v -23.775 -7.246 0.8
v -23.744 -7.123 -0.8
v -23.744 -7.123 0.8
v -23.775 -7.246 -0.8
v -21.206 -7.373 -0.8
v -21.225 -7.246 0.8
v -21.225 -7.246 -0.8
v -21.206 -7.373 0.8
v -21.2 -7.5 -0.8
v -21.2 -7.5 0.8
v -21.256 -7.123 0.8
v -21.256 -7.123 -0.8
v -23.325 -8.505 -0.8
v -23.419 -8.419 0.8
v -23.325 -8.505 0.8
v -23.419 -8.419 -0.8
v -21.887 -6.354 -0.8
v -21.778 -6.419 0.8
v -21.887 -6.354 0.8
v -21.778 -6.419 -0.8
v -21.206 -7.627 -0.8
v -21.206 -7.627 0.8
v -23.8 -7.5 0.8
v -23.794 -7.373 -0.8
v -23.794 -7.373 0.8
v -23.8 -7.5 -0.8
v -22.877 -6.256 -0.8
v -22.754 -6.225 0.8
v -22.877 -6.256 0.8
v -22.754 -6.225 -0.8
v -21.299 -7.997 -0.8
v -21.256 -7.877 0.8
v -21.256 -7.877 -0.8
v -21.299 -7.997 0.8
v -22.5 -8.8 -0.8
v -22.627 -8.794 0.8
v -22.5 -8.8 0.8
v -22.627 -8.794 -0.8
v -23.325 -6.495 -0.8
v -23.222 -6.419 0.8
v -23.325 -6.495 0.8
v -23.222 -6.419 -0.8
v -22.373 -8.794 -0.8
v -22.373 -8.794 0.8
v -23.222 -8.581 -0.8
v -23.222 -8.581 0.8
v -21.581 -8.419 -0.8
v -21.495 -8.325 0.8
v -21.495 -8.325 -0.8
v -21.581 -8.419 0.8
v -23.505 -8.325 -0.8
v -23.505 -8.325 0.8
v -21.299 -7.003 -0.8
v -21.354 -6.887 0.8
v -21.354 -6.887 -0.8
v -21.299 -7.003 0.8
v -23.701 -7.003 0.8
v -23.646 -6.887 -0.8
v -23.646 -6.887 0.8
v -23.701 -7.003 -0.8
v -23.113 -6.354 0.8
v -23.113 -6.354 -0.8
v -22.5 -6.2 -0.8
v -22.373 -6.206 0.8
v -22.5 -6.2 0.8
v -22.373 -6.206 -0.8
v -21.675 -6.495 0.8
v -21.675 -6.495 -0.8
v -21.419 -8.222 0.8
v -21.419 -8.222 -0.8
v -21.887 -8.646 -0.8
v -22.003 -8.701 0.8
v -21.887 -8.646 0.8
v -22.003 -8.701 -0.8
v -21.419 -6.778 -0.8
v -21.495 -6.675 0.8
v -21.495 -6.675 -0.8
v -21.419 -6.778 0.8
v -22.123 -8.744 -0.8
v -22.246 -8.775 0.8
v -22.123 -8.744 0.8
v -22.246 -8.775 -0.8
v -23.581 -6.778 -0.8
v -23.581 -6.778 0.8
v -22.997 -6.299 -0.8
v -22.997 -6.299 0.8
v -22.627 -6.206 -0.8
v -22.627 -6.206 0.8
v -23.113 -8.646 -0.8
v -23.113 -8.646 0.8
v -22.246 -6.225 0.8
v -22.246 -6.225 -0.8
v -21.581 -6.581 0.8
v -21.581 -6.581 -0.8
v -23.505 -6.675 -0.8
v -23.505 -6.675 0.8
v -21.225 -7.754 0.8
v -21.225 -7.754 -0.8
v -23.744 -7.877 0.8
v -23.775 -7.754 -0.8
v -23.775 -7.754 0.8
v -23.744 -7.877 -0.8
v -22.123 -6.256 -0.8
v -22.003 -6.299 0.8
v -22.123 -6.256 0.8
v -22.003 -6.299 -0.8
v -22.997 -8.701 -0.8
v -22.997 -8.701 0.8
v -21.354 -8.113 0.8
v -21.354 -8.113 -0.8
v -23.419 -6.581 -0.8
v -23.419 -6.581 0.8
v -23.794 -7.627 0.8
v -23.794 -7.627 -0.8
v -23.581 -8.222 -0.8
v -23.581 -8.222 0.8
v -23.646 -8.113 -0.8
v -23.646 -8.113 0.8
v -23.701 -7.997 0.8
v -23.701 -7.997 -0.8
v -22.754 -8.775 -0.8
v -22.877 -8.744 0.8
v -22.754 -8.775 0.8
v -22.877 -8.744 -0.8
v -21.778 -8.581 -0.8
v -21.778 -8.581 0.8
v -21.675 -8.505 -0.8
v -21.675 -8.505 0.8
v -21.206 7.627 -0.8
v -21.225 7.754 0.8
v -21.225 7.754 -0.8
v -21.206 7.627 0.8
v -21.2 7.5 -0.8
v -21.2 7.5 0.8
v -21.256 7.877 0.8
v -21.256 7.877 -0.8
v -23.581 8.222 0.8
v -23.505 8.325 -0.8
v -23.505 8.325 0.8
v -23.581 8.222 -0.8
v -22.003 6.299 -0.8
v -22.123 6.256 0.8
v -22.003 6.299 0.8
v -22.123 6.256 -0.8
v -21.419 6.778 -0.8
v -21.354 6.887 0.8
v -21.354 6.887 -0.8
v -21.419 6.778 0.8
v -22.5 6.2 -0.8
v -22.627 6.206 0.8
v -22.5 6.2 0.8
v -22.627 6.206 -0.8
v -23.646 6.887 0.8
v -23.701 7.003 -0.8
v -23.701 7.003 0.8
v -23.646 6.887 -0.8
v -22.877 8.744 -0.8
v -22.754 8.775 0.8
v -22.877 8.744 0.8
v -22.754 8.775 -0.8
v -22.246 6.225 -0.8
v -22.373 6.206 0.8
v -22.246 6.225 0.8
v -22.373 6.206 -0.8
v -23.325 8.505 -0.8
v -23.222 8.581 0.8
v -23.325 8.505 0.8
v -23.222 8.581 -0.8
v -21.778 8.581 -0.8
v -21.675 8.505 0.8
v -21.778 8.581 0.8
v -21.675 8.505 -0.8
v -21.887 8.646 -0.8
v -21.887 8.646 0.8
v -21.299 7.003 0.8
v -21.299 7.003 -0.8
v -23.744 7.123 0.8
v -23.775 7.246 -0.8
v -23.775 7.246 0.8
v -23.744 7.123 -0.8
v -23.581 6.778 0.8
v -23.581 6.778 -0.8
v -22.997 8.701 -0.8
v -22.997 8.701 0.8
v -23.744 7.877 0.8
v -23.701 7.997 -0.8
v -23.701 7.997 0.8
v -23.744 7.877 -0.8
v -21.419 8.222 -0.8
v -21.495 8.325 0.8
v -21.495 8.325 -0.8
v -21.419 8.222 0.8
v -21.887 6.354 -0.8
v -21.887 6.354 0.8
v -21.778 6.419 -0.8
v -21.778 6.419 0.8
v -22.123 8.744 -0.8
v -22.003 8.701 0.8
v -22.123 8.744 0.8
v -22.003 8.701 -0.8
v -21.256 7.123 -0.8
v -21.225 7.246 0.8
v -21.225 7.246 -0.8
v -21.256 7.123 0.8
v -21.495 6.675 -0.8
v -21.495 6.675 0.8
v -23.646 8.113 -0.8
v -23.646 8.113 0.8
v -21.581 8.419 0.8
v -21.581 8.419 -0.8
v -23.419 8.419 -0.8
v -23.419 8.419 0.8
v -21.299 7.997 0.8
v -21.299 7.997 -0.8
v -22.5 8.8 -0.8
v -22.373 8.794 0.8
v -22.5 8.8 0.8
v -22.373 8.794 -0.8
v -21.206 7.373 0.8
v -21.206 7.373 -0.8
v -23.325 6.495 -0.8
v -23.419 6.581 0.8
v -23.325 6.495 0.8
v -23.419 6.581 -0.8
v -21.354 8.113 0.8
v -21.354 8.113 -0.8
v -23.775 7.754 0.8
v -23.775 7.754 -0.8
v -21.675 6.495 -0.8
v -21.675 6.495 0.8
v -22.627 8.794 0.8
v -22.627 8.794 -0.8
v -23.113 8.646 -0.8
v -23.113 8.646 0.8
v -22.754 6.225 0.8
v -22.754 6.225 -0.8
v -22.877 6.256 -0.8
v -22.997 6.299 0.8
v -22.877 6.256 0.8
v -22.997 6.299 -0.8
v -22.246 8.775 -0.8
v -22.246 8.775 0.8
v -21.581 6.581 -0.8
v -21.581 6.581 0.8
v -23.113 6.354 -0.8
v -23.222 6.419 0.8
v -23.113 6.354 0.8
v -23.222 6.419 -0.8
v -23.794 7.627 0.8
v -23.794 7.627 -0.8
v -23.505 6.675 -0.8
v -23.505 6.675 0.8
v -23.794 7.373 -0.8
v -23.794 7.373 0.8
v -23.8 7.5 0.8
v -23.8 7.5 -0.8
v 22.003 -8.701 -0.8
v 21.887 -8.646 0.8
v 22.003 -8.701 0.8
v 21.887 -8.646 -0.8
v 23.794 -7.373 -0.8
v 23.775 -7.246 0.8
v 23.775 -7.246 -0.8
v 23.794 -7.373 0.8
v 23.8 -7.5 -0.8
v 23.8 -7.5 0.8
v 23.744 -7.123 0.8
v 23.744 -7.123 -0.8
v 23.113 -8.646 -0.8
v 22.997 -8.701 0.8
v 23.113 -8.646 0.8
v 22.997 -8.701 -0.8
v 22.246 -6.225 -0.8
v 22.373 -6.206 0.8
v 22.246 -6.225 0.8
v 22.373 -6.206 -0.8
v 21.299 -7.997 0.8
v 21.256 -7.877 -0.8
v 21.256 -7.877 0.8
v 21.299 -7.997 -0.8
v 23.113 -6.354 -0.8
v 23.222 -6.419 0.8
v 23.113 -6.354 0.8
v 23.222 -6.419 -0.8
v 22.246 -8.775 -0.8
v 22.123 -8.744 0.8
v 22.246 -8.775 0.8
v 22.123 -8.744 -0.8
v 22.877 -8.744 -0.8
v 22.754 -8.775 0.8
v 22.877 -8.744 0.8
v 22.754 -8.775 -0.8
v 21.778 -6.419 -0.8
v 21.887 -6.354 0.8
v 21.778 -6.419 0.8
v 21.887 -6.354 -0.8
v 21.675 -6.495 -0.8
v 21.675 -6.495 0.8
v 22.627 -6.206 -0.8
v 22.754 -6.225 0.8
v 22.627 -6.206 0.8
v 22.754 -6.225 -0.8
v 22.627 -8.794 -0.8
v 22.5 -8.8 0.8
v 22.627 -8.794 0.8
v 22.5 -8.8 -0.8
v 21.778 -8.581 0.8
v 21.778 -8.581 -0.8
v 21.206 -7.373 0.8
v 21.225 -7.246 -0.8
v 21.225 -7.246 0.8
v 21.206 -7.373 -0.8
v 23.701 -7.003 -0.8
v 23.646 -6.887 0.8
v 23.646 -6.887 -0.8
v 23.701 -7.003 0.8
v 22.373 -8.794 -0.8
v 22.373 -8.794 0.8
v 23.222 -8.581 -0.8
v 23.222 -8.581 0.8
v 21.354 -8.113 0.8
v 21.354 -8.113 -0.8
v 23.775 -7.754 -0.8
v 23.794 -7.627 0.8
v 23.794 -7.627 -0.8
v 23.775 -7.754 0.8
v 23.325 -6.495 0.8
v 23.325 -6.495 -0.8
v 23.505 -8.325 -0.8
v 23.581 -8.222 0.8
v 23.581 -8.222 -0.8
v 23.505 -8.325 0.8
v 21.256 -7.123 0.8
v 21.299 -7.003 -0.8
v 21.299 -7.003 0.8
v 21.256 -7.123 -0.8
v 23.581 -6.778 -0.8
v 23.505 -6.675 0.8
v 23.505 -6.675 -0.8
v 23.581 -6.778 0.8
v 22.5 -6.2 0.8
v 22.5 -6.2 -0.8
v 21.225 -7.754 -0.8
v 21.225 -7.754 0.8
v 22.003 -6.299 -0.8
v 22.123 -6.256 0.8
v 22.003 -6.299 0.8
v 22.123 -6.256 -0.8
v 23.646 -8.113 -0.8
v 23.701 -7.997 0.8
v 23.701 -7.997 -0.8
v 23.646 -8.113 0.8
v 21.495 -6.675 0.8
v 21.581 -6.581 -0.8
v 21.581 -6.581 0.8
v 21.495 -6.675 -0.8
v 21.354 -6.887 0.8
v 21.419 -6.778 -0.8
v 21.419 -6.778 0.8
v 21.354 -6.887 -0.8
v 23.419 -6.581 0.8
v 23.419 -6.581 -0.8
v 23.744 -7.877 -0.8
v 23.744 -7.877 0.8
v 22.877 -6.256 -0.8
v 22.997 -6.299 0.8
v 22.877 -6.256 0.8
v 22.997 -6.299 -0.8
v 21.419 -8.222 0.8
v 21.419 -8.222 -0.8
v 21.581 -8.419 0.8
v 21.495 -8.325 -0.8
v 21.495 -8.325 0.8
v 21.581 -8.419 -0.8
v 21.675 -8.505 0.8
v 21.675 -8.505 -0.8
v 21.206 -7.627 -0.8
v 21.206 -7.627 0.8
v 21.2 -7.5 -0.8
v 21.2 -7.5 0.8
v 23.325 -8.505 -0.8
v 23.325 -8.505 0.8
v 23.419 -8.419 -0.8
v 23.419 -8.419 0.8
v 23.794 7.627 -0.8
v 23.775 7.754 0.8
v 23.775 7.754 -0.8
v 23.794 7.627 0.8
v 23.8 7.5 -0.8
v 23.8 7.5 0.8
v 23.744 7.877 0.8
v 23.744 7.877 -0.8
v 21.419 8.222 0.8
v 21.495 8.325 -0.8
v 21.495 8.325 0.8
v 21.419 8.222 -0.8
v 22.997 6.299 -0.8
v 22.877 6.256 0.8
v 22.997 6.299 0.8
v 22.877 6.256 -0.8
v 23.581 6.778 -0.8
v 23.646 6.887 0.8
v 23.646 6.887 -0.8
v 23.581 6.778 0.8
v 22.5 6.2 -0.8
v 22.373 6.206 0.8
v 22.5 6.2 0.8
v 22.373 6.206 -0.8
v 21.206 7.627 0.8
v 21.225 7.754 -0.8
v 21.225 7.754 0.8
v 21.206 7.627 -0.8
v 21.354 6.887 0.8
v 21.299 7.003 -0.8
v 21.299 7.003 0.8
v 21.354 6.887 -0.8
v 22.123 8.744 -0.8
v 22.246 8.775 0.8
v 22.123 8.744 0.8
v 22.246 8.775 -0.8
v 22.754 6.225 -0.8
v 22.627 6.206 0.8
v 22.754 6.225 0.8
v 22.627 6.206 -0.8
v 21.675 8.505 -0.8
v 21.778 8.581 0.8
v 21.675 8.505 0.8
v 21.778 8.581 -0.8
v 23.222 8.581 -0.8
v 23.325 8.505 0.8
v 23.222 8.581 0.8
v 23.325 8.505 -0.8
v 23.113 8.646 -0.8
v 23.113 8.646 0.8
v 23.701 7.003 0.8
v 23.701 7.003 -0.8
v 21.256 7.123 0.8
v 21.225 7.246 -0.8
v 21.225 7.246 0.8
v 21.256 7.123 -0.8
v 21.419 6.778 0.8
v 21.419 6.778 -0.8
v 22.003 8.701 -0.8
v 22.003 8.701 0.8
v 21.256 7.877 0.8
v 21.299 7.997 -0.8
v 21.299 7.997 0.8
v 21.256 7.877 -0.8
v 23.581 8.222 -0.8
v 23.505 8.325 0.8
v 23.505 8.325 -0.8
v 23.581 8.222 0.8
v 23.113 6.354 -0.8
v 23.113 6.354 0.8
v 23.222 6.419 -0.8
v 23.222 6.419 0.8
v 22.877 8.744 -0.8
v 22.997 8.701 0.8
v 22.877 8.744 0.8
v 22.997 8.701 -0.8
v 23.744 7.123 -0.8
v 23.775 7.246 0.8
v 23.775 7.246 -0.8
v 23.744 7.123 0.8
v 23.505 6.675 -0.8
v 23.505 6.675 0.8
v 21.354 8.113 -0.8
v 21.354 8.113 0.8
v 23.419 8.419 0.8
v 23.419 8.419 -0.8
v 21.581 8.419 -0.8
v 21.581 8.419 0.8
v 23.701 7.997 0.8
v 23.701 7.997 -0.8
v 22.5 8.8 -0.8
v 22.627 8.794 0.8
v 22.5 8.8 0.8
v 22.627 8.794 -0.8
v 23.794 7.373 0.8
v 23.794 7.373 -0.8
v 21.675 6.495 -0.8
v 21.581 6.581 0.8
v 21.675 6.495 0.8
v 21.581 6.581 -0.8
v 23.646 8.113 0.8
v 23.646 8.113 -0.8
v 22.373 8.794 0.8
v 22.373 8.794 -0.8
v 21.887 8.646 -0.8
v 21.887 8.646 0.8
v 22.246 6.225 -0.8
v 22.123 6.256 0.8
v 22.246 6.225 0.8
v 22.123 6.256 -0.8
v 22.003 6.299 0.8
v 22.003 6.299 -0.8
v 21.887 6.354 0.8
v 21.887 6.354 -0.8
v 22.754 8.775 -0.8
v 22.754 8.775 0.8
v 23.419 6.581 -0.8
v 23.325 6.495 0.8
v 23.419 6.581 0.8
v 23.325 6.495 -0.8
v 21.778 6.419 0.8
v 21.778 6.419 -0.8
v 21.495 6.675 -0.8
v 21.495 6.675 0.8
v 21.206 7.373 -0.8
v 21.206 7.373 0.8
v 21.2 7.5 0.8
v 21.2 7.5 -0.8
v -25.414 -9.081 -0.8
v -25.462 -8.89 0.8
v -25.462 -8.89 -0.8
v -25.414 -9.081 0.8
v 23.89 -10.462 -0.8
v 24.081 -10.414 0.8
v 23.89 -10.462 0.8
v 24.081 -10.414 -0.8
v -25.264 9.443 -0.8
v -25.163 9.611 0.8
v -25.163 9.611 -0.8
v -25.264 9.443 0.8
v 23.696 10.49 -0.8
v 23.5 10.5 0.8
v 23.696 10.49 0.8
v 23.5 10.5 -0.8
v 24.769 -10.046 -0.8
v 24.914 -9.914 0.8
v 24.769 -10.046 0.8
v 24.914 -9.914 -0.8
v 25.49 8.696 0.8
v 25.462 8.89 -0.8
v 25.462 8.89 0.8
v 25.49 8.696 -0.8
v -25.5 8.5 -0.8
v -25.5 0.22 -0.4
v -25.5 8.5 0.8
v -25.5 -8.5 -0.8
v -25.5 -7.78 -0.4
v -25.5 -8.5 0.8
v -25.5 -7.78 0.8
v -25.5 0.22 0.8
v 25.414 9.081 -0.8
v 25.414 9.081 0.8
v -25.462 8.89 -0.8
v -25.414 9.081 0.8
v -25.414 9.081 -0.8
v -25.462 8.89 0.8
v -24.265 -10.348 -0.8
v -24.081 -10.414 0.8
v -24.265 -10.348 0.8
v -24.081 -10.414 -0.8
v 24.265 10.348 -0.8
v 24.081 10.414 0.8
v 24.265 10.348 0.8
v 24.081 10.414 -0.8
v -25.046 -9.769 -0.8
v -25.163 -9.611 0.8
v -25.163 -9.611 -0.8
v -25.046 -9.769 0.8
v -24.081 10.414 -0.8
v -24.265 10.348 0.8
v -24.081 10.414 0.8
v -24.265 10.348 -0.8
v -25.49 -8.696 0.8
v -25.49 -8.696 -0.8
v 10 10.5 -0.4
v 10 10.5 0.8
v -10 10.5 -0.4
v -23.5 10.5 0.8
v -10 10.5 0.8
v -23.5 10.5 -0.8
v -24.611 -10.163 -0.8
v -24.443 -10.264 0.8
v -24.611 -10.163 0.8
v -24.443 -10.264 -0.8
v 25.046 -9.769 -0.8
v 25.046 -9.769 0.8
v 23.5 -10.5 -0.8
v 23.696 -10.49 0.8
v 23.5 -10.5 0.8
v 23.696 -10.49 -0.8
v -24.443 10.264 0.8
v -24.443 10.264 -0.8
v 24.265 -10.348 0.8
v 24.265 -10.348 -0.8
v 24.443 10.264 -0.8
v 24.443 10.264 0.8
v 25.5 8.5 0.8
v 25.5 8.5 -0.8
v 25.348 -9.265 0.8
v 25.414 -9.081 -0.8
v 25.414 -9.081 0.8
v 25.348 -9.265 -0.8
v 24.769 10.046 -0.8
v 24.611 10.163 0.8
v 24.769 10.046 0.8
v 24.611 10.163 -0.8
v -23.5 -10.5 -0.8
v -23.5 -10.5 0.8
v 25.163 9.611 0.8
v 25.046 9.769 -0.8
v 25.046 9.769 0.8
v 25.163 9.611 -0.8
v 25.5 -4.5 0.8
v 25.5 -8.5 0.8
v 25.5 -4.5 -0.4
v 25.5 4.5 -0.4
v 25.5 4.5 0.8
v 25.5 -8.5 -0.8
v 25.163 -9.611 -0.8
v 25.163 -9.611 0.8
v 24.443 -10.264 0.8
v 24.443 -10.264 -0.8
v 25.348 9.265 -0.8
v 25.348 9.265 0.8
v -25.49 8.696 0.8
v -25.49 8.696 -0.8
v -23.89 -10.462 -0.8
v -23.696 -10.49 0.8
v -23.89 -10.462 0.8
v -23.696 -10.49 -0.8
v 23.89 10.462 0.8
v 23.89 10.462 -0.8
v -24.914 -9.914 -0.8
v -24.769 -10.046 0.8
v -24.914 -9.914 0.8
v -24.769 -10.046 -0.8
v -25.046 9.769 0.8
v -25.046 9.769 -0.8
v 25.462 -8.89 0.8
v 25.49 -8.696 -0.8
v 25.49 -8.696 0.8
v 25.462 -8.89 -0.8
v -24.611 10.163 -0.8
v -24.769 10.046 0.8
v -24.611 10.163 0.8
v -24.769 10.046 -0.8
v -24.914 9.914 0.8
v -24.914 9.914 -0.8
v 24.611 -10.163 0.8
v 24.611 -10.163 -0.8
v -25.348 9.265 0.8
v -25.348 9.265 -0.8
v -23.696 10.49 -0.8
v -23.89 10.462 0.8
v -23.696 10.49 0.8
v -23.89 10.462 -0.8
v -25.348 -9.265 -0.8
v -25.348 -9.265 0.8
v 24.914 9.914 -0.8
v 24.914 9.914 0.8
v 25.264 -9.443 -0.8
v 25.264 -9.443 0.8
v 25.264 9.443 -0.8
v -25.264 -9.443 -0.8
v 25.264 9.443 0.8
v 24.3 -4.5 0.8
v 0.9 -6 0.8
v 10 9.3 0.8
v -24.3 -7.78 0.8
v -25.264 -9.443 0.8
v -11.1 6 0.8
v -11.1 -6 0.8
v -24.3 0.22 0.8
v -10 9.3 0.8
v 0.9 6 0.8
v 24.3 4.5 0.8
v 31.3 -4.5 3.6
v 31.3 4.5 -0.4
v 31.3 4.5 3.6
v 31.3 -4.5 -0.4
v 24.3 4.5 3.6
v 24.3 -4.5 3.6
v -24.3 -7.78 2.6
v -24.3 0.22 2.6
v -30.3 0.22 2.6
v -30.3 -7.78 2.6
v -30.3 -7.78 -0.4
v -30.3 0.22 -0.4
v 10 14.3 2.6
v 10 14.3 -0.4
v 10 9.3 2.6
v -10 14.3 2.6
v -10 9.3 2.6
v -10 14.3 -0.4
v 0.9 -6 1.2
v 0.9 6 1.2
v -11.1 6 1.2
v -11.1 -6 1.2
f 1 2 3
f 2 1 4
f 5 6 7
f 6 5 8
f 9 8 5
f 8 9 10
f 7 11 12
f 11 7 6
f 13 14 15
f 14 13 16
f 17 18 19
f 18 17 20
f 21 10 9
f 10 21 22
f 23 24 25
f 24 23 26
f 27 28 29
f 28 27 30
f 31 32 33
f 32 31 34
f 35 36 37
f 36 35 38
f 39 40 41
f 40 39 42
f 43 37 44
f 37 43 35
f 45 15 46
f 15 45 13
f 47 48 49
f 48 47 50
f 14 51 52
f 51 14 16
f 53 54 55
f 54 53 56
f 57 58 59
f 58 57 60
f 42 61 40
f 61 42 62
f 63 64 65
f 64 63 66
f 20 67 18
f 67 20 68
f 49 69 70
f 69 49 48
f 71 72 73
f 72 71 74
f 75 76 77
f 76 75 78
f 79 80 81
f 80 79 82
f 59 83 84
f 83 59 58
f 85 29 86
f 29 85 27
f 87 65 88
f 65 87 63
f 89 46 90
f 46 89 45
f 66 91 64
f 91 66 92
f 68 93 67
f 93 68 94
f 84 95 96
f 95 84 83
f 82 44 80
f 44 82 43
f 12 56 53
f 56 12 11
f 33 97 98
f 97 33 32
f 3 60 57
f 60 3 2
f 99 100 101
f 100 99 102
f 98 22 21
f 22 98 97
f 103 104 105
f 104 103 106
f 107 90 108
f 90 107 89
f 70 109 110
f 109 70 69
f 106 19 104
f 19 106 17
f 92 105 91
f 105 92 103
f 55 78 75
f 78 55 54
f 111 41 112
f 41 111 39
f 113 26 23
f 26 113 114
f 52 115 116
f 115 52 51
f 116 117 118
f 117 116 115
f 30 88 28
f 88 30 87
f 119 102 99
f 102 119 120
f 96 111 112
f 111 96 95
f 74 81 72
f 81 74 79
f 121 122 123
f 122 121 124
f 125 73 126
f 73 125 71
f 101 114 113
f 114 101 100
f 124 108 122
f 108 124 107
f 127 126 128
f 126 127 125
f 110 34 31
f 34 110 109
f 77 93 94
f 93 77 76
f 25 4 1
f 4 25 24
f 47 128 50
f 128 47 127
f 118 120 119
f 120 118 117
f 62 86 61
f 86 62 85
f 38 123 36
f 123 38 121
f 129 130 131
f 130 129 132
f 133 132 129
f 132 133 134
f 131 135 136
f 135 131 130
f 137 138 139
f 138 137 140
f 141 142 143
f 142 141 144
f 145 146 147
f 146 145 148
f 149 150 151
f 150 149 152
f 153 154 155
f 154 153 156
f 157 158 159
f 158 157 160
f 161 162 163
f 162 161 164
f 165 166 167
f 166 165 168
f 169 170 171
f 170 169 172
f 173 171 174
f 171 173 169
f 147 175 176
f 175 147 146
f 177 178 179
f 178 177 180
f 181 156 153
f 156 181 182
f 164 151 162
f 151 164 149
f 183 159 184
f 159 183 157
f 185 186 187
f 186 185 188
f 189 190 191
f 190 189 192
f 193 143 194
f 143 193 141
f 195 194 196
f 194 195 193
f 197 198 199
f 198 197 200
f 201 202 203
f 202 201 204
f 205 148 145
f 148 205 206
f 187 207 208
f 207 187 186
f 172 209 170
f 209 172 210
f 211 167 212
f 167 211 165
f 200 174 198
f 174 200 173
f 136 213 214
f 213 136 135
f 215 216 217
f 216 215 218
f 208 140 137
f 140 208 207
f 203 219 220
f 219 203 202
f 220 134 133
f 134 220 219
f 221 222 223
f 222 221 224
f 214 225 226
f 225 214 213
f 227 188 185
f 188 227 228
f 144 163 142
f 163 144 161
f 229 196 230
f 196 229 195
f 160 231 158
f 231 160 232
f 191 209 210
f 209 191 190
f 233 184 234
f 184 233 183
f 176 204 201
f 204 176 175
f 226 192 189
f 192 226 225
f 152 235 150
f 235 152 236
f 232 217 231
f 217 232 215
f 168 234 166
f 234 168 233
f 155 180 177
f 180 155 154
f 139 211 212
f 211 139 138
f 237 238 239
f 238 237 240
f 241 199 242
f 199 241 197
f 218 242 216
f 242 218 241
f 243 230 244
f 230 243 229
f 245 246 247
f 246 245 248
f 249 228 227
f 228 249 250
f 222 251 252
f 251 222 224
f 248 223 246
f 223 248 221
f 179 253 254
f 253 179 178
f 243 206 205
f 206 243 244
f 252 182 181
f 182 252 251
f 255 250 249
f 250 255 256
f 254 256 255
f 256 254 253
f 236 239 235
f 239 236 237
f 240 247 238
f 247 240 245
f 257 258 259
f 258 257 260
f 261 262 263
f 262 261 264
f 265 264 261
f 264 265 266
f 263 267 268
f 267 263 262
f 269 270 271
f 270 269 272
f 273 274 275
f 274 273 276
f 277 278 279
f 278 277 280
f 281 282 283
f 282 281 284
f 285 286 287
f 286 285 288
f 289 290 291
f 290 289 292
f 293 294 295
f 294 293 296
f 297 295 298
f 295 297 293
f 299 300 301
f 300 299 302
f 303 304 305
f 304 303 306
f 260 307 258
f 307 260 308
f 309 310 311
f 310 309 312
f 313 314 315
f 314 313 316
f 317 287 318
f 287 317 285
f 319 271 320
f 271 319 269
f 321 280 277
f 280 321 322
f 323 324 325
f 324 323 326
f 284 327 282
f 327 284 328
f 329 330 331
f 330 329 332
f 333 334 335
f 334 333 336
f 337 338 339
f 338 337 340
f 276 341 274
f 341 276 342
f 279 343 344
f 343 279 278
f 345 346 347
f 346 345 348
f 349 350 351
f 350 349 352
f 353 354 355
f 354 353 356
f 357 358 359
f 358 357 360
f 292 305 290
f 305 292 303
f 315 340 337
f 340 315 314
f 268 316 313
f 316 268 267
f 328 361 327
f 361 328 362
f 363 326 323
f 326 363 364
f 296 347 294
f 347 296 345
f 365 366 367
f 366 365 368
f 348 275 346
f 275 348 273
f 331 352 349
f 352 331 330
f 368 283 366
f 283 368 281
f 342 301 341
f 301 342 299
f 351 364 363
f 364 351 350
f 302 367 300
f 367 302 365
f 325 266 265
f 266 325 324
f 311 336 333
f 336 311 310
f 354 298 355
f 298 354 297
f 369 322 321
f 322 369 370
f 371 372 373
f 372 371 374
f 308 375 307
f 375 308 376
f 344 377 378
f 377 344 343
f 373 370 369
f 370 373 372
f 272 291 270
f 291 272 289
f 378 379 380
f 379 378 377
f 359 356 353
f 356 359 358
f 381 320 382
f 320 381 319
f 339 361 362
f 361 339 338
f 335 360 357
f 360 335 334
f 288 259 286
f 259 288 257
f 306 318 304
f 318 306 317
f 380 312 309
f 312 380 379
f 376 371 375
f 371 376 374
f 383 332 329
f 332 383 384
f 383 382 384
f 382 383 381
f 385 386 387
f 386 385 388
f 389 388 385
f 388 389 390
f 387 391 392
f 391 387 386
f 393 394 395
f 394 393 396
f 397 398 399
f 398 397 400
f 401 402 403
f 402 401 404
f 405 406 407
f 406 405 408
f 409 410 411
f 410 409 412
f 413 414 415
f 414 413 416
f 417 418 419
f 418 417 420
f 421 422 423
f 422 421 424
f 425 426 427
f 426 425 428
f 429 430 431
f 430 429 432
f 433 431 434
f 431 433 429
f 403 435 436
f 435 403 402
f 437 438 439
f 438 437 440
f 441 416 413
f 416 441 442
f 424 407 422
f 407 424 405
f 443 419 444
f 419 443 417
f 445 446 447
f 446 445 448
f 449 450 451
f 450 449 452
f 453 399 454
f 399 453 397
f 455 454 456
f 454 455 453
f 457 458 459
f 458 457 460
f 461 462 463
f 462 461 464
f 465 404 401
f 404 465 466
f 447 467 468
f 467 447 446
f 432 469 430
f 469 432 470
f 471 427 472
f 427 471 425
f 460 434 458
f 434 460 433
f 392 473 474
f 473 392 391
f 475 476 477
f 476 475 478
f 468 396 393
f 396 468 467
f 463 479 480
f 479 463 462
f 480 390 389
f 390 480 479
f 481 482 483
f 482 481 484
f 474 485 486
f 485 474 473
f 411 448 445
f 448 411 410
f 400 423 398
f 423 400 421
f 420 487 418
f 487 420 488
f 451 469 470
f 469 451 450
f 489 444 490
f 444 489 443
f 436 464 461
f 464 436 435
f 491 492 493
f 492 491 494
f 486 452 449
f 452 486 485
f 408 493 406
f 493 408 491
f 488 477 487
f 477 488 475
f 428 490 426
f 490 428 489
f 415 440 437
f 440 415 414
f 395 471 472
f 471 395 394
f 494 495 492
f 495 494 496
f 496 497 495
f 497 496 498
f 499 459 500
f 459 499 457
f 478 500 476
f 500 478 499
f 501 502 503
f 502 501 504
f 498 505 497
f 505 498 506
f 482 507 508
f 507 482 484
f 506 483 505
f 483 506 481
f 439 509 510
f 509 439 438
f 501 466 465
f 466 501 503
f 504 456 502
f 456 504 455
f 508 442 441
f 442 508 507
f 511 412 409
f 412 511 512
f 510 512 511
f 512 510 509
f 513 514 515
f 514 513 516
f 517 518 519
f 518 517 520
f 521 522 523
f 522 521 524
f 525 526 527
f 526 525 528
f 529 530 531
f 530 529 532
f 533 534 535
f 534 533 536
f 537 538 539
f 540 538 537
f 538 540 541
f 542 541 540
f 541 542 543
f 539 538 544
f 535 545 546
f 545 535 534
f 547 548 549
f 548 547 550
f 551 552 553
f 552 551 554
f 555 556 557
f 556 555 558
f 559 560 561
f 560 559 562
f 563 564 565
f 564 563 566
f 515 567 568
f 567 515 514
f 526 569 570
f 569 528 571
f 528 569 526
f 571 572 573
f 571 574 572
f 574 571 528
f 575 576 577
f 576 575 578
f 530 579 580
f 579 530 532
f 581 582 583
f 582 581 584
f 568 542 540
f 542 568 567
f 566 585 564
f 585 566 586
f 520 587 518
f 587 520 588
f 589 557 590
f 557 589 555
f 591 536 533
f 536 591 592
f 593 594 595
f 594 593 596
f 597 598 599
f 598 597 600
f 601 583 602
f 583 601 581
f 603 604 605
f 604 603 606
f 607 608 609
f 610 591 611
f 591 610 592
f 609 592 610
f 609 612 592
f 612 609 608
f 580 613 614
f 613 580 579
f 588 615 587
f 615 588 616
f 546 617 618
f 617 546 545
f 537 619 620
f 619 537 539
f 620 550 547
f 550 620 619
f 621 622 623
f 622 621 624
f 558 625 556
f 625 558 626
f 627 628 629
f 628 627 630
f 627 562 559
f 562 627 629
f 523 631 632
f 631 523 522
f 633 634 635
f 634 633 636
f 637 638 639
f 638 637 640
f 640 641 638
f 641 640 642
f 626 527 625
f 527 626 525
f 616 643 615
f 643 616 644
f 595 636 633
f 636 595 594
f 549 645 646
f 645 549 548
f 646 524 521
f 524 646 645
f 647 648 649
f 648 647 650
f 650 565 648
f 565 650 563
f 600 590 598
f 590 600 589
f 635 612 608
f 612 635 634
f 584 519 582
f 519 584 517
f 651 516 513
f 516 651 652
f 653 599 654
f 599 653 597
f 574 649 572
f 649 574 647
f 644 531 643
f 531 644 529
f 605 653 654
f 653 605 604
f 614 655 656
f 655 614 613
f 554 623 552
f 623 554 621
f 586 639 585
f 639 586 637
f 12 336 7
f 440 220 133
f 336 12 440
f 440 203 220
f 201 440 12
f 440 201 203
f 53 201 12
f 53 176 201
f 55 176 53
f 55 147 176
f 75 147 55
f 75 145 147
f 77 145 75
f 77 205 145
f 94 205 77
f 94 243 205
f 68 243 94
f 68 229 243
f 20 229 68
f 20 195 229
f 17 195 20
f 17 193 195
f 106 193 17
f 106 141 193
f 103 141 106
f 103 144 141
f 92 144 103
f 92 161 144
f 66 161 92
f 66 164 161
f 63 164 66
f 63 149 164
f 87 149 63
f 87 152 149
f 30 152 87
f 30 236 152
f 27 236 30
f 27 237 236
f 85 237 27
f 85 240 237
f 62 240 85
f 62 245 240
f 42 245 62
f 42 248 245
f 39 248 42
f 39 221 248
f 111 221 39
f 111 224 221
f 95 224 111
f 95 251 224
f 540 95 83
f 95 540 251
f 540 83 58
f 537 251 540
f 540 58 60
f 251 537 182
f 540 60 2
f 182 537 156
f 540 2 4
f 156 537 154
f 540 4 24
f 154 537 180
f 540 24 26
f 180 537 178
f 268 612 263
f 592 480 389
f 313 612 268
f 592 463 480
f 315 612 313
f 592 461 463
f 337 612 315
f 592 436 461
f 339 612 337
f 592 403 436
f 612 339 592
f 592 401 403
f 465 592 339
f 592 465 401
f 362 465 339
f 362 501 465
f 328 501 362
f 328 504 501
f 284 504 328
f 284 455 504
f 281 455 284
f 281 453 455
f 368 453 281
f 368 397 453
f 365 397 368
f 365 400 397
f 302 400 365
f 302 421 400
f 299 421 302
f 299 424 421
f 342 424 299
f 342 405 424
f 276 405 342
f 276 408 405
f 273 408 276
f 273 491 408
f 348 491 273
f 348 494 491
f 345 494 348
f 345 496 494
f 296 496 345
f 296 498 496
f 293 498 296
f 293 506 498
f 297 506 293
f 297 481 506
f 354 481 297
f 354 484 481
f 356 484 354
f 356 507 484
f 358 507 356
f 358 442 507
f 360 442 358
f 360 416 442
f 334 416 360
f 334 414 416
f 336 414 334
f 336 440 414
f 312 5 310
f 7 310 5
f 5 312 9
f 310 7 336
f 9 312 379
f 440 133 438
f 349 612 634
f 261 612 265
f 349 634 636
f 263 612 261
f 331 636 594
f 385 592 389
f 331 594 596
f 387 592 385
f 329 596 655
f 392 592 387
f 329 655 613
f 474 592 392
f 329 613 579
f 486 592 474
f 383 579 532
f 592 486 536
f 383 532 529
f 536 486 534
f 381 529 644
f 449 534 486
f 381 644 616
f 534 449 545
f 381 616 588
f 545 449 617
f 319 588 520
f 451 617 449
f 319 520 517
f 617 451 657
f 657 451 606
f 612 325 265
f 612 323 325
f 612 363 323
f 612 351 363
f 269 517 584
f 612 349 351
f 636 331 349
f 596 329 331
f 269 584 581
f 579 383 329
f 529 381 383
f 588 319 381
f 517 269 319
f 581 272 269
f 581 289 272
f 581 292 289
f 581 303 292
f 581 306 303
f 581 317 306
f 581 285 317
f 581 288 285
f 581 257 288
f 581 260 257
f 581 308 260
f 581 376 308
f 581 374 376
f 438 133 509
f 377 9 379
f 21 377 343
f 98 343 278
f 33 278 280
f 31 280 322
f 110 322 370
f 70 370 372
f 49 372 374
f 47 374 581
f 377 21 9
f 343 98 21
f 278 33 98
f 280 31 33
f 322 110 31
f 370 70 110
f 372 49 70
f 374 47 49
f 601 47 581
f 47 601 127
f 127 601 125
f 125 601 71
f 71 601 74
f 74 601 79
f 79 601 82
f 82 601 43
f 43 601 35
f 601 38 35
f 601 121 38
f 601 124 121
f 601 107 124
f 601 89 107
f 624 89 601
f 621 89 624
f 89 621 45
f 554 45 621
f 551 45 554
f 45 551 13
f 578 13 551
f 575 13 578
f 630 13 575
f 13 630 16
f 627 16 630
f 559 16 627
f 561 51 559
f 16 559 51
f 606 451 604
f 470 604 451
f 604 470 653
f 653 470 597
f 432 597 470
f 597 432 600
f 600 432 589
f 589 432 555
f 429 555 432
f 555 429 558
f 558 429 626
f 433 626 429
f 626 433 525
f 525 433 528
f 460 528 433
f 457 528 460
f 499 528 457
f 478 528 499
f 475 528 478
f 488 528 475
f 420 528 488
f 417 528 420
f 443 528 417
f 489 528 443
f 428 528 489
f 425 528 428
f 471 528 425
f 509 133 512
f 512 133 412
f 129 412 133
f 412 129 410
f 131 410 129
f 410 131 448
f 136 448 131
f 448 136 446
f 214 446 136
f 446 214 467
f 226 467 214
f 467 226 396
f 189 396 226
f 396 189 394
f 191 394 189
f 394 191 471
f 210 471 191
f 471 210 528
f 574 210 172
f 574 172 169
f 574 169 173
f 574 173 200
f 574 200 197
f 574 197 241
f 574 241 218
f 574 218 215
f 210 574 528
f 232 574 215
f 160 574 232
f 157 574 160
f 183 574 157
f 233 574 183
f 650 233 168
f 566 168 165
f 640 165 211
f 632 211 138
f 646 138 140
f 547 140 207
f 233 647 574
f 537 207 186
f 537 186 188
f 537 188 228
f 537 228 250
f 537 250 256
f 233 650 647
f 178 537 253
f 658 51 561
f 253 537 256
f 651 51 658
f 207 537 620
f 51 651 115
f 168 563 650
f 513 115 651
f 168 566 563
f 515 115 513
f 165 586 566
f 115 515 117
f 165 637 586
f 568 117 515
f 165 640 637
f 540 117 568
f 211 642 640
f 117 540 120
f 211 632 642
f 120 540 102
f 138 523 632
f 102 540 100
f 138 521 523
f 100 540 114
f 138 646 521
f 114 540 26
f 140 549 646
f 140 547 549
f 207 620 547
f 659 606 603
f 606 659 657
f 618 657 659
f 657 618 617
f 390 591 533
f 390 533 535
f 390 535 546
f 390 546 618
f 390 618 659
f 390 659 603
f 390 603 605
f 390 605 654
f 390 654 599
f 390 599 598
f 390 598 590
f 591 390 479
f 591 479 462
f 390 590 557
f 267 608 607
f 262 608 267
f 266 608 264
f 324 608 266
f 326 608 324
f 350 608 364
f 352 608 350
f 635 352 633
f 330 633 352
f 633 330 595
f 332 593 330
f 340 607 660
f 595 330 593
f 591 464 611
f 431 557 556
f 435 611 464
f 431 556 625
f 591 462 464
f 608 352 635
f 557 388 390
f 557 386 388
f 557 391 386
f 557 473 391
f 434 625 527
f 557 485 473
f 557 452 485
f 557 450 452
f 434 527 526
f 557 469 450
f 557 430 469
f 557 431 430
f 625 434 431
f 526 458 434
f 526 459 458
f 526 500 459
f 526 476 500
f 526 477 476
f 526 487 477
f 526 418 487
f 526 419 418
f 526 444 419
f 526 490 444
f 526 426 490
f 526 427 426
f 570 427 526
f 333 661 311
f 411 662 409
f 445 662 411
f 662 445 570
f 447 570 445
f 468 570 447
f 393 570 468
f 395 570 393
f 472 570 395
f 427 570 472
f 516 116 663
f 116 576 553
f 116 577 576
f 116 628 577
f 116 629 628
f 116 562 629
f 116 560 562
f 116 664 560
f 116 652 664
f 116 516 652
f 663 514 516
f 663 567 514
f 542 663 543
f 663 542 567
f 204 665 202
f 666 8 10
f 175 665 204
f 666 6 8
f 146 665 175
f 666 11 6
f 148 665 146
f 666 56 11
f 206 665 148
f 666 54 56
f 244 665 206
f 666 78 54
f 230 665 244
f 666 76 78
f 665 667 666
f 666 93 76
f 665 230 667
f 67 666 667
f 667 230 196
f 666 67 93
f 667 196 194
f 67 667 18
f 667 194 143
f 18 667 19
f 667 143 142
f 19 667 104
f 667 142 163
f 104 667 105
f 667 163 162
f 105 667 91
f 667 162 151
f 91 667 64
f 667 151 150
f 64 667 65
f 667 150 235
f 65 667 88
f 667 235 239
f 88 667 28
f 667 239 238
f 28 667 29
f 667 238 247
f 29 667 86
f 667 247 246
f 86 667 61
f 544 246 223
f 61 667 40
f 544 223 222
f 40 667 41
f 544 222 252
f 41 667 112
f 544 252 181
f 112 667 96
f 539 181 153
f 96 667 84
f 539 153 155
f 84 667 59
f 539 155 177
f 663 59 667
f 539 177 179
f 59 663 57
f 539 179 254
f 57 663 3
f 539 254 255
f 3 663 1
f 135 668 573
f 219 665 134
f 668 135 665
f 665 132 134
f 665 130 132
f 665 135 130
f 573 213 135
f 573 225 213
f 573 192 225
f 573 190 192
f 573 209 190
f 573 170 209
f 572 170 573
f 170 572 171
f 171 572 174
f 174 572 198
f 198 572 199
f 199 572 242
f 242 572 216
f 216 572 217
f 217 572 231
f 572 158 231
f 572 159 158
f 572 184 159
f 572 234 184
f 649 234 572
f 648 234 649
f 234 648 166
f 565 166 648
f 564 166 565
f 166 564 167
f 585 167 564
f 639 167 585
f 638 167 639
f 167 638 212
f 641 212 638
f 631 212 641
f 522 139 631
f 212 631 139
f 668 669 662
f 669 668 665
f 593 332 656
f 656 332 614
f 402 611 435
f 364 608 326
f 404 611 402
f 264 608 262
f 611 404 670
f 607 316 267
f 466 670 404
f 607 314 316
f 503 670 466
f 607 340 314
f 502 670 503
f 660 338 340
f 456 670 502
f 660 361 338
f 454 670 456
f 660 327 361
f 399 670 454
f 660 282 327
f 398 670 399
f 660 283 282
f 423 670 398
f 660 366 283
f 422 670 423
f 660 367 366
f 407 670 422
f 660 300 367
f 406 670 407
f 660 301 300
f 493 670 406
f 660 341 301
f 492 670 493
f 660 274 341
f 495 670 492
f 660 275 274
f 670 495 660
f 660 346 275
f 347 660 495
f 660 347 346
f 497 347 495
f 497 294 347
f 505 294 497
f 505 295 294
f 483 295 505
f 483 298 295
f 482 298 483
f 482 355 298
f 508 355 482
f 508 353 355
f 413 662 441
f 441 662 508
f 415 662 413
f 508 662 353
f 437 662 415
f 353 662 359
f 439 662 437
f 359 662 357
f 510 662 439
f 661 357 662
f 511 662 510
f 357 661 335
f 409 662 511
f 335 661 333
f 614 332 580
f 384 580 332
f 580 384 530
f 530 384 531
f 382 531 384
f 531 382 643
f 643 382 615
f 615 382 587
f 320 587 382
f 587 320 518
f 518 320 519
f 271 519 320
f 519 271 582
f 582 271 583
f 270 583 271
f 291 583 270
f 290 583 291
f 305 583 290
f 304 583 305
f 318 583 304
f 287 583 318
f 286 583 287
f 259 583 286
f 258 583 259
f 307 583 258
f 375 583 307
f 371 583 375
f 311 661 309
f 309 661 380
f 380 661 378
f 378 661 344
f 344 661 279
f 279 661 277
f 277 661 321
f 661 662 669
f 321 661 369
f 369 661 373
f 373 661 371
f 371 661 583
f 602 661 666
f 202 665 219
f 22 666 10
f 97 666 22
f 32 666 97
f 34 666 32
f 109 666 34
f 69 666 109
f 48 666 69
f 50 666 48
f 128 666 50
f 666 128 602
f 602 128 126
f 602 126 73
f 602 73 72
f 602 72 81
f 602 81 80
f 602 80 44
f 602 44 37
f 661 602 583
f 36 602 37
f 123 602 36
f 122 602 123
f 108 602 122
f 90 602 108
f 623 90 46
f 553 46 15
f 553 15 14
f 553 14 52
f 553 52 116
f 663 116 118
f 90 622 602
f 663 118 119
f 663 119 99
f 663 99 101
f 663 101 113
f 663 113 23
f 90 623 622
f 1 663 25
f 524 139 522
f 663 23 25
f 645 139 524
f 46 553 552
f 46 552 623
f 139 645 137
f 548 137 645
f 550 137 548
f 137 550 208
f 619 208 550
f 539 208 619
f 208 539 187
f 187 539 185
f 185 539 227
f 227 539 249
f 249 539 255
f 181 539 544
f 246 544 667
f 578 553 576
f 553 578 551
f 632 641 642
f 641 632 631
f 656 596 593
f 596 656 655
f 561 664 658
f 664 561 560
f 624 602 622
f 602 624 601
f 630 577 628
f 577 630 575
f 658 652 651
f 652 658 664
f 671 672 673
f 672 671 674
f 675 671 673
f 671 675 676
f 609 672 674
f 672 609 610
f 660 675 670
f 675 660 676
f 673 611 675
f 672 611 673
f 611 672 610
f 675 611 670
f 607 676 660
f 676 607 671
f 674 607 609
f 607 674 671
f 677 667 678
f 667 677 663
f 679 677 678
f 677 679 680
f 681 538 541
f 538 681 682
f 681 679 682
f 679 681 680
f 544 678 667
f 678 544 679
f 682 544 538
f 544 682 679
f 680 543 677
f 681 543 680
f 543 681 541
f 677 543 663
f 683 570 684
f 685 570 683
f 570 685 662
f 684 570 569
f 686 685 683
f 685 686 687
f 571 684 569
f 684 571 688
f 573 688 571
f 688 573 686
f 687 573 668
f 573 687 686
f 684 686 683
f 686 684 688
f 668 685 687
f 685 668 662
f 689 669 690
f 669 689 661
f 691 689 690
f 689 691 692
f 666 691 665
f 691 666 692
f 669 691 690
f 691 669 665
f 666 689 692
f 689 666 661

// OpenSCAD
$fn = 64;

// Requested overall PCB size (simple thin rectangular PCB)
pcb_L = 51.0;
pcb_W = 21.0;
pcb_T = 1.6;

// Overlap to guarantee watertight unions (1–2mm as requested)
ov = 1.2;

// Corner radius (kept modest)
corner_r = 2.0;

// Mounting holes (kept, but on the rectangular PCB)
hole_d = 2.6;
hole_edge_x = 3.0;
hole_edge_y = 3.0;

// Simple SBC-like components (small, mounted on top face)
usb_L = 7.0;
usb_W = 9.0;
usb_H = 4.0;

hdmi_L = 6.0;
hdmi_W = 8.0;
hdmi_H = 3.0;

header_L = 20.0;
header_W = 5.0;
header_H = 3.0;

chip_L = 12.0;
chip_W = 12.0;
chip_H = 1.6;

reg_L = 8.0;
reg_W = 6.0;
reg_H = 1.2;

module rounded_rect_2d(L, W, r) {
    r2 = min(r, min(L, W)/2);
    hull() {
        translate([ L/2 - r2,  W/2 - r2]) circle(r=r2);
        translate([-L/2 + r2,  W/2 - r2]) circle(r=r2);
        translate([ L/2 - r2, -W/2 + r2]) circle(r=r2);
        translate([-L/2 + r2, -W/2 + r2]) circle(r=r2);
    }
}

module pcb_plate() {
    // Flat rectangular PCB as the primary body (51 x 21 x 1.6)
    linear_extrude(height=pcb_T, center=true)
        rounded_rect_2d(pcb_L, pcb_W, corner_r);
}

module mounting_holes() {
    for (sx = [-1, 1], sy = [-1, 1]) {
        translate([ sx*(pcb_L/2 - hole_edge_x), sy*(pcb_W/2 - hole_edge_y), 0 ])
            cylinder(h=pcb_T + 2, d=hole_d, center=true);
    }
}

module usb_connector() {
    // On +X edge, centered in Y; overlaps into PCB by ov
    translate([
        pcb_L/2 + usb_L/2 - ov,
        0,
        pcb_T/2 + usb_H/2 - ov
    ])
        cube([usb_L, usb_W, usb_H], center=true);
}

module hdmi_connector() {
    // On -X edge, slightly offset in Y; overlaps into PCB by ov
    translate([
        -pcb_L/2 - hdmi_L/2 + ov,
        -pcb_W*0.18,
        pcb_T/2 + hdmi_H/2 - ov
    ])
        cube([hdmi_L, hdmi_W, hdmi_H], center=true);
}

module gpio_header() {
    // Along +Y edge; overlaps into PCB by ov
    translate([
        0,
        pcb_W/2 + header_W/2 - ov,
        pcb_T/2 + header_H/2 - ov
    ])
        cube([header_L, header_W, header_H], center=true);
}

module main_chip() {
    // On top face; overlaps into PCB by ov
    translate([
        -pcb_L*0.10,
        0,
        pcb_T/2 + chip_H/2 - ov
    ])
        cube([chip_L, chip_W, chip_H], center=true);
}

module regulator() {
    // On top face; overlaps into PCB by ov
    translate([
        pcb_L*0.18,
        -pcb_W*0.22,
        pcb_T/2 + reg_H/2 - ov
    ])
        cube([reg_L, reg_W, reg_H], center=true);
}

module sbc() {
    union() {
        // Thin PCB with holes (still a single solid after union with components)
        difference() {
            pcb_plate();
            mounting_holes();
        }

        // Components/connectors (all connected via overlap into PCB)
        usb_connector();
        hdmi_connector();
        gpio_header();
        main_chip();
        regulator();
    }
}

sbc();
